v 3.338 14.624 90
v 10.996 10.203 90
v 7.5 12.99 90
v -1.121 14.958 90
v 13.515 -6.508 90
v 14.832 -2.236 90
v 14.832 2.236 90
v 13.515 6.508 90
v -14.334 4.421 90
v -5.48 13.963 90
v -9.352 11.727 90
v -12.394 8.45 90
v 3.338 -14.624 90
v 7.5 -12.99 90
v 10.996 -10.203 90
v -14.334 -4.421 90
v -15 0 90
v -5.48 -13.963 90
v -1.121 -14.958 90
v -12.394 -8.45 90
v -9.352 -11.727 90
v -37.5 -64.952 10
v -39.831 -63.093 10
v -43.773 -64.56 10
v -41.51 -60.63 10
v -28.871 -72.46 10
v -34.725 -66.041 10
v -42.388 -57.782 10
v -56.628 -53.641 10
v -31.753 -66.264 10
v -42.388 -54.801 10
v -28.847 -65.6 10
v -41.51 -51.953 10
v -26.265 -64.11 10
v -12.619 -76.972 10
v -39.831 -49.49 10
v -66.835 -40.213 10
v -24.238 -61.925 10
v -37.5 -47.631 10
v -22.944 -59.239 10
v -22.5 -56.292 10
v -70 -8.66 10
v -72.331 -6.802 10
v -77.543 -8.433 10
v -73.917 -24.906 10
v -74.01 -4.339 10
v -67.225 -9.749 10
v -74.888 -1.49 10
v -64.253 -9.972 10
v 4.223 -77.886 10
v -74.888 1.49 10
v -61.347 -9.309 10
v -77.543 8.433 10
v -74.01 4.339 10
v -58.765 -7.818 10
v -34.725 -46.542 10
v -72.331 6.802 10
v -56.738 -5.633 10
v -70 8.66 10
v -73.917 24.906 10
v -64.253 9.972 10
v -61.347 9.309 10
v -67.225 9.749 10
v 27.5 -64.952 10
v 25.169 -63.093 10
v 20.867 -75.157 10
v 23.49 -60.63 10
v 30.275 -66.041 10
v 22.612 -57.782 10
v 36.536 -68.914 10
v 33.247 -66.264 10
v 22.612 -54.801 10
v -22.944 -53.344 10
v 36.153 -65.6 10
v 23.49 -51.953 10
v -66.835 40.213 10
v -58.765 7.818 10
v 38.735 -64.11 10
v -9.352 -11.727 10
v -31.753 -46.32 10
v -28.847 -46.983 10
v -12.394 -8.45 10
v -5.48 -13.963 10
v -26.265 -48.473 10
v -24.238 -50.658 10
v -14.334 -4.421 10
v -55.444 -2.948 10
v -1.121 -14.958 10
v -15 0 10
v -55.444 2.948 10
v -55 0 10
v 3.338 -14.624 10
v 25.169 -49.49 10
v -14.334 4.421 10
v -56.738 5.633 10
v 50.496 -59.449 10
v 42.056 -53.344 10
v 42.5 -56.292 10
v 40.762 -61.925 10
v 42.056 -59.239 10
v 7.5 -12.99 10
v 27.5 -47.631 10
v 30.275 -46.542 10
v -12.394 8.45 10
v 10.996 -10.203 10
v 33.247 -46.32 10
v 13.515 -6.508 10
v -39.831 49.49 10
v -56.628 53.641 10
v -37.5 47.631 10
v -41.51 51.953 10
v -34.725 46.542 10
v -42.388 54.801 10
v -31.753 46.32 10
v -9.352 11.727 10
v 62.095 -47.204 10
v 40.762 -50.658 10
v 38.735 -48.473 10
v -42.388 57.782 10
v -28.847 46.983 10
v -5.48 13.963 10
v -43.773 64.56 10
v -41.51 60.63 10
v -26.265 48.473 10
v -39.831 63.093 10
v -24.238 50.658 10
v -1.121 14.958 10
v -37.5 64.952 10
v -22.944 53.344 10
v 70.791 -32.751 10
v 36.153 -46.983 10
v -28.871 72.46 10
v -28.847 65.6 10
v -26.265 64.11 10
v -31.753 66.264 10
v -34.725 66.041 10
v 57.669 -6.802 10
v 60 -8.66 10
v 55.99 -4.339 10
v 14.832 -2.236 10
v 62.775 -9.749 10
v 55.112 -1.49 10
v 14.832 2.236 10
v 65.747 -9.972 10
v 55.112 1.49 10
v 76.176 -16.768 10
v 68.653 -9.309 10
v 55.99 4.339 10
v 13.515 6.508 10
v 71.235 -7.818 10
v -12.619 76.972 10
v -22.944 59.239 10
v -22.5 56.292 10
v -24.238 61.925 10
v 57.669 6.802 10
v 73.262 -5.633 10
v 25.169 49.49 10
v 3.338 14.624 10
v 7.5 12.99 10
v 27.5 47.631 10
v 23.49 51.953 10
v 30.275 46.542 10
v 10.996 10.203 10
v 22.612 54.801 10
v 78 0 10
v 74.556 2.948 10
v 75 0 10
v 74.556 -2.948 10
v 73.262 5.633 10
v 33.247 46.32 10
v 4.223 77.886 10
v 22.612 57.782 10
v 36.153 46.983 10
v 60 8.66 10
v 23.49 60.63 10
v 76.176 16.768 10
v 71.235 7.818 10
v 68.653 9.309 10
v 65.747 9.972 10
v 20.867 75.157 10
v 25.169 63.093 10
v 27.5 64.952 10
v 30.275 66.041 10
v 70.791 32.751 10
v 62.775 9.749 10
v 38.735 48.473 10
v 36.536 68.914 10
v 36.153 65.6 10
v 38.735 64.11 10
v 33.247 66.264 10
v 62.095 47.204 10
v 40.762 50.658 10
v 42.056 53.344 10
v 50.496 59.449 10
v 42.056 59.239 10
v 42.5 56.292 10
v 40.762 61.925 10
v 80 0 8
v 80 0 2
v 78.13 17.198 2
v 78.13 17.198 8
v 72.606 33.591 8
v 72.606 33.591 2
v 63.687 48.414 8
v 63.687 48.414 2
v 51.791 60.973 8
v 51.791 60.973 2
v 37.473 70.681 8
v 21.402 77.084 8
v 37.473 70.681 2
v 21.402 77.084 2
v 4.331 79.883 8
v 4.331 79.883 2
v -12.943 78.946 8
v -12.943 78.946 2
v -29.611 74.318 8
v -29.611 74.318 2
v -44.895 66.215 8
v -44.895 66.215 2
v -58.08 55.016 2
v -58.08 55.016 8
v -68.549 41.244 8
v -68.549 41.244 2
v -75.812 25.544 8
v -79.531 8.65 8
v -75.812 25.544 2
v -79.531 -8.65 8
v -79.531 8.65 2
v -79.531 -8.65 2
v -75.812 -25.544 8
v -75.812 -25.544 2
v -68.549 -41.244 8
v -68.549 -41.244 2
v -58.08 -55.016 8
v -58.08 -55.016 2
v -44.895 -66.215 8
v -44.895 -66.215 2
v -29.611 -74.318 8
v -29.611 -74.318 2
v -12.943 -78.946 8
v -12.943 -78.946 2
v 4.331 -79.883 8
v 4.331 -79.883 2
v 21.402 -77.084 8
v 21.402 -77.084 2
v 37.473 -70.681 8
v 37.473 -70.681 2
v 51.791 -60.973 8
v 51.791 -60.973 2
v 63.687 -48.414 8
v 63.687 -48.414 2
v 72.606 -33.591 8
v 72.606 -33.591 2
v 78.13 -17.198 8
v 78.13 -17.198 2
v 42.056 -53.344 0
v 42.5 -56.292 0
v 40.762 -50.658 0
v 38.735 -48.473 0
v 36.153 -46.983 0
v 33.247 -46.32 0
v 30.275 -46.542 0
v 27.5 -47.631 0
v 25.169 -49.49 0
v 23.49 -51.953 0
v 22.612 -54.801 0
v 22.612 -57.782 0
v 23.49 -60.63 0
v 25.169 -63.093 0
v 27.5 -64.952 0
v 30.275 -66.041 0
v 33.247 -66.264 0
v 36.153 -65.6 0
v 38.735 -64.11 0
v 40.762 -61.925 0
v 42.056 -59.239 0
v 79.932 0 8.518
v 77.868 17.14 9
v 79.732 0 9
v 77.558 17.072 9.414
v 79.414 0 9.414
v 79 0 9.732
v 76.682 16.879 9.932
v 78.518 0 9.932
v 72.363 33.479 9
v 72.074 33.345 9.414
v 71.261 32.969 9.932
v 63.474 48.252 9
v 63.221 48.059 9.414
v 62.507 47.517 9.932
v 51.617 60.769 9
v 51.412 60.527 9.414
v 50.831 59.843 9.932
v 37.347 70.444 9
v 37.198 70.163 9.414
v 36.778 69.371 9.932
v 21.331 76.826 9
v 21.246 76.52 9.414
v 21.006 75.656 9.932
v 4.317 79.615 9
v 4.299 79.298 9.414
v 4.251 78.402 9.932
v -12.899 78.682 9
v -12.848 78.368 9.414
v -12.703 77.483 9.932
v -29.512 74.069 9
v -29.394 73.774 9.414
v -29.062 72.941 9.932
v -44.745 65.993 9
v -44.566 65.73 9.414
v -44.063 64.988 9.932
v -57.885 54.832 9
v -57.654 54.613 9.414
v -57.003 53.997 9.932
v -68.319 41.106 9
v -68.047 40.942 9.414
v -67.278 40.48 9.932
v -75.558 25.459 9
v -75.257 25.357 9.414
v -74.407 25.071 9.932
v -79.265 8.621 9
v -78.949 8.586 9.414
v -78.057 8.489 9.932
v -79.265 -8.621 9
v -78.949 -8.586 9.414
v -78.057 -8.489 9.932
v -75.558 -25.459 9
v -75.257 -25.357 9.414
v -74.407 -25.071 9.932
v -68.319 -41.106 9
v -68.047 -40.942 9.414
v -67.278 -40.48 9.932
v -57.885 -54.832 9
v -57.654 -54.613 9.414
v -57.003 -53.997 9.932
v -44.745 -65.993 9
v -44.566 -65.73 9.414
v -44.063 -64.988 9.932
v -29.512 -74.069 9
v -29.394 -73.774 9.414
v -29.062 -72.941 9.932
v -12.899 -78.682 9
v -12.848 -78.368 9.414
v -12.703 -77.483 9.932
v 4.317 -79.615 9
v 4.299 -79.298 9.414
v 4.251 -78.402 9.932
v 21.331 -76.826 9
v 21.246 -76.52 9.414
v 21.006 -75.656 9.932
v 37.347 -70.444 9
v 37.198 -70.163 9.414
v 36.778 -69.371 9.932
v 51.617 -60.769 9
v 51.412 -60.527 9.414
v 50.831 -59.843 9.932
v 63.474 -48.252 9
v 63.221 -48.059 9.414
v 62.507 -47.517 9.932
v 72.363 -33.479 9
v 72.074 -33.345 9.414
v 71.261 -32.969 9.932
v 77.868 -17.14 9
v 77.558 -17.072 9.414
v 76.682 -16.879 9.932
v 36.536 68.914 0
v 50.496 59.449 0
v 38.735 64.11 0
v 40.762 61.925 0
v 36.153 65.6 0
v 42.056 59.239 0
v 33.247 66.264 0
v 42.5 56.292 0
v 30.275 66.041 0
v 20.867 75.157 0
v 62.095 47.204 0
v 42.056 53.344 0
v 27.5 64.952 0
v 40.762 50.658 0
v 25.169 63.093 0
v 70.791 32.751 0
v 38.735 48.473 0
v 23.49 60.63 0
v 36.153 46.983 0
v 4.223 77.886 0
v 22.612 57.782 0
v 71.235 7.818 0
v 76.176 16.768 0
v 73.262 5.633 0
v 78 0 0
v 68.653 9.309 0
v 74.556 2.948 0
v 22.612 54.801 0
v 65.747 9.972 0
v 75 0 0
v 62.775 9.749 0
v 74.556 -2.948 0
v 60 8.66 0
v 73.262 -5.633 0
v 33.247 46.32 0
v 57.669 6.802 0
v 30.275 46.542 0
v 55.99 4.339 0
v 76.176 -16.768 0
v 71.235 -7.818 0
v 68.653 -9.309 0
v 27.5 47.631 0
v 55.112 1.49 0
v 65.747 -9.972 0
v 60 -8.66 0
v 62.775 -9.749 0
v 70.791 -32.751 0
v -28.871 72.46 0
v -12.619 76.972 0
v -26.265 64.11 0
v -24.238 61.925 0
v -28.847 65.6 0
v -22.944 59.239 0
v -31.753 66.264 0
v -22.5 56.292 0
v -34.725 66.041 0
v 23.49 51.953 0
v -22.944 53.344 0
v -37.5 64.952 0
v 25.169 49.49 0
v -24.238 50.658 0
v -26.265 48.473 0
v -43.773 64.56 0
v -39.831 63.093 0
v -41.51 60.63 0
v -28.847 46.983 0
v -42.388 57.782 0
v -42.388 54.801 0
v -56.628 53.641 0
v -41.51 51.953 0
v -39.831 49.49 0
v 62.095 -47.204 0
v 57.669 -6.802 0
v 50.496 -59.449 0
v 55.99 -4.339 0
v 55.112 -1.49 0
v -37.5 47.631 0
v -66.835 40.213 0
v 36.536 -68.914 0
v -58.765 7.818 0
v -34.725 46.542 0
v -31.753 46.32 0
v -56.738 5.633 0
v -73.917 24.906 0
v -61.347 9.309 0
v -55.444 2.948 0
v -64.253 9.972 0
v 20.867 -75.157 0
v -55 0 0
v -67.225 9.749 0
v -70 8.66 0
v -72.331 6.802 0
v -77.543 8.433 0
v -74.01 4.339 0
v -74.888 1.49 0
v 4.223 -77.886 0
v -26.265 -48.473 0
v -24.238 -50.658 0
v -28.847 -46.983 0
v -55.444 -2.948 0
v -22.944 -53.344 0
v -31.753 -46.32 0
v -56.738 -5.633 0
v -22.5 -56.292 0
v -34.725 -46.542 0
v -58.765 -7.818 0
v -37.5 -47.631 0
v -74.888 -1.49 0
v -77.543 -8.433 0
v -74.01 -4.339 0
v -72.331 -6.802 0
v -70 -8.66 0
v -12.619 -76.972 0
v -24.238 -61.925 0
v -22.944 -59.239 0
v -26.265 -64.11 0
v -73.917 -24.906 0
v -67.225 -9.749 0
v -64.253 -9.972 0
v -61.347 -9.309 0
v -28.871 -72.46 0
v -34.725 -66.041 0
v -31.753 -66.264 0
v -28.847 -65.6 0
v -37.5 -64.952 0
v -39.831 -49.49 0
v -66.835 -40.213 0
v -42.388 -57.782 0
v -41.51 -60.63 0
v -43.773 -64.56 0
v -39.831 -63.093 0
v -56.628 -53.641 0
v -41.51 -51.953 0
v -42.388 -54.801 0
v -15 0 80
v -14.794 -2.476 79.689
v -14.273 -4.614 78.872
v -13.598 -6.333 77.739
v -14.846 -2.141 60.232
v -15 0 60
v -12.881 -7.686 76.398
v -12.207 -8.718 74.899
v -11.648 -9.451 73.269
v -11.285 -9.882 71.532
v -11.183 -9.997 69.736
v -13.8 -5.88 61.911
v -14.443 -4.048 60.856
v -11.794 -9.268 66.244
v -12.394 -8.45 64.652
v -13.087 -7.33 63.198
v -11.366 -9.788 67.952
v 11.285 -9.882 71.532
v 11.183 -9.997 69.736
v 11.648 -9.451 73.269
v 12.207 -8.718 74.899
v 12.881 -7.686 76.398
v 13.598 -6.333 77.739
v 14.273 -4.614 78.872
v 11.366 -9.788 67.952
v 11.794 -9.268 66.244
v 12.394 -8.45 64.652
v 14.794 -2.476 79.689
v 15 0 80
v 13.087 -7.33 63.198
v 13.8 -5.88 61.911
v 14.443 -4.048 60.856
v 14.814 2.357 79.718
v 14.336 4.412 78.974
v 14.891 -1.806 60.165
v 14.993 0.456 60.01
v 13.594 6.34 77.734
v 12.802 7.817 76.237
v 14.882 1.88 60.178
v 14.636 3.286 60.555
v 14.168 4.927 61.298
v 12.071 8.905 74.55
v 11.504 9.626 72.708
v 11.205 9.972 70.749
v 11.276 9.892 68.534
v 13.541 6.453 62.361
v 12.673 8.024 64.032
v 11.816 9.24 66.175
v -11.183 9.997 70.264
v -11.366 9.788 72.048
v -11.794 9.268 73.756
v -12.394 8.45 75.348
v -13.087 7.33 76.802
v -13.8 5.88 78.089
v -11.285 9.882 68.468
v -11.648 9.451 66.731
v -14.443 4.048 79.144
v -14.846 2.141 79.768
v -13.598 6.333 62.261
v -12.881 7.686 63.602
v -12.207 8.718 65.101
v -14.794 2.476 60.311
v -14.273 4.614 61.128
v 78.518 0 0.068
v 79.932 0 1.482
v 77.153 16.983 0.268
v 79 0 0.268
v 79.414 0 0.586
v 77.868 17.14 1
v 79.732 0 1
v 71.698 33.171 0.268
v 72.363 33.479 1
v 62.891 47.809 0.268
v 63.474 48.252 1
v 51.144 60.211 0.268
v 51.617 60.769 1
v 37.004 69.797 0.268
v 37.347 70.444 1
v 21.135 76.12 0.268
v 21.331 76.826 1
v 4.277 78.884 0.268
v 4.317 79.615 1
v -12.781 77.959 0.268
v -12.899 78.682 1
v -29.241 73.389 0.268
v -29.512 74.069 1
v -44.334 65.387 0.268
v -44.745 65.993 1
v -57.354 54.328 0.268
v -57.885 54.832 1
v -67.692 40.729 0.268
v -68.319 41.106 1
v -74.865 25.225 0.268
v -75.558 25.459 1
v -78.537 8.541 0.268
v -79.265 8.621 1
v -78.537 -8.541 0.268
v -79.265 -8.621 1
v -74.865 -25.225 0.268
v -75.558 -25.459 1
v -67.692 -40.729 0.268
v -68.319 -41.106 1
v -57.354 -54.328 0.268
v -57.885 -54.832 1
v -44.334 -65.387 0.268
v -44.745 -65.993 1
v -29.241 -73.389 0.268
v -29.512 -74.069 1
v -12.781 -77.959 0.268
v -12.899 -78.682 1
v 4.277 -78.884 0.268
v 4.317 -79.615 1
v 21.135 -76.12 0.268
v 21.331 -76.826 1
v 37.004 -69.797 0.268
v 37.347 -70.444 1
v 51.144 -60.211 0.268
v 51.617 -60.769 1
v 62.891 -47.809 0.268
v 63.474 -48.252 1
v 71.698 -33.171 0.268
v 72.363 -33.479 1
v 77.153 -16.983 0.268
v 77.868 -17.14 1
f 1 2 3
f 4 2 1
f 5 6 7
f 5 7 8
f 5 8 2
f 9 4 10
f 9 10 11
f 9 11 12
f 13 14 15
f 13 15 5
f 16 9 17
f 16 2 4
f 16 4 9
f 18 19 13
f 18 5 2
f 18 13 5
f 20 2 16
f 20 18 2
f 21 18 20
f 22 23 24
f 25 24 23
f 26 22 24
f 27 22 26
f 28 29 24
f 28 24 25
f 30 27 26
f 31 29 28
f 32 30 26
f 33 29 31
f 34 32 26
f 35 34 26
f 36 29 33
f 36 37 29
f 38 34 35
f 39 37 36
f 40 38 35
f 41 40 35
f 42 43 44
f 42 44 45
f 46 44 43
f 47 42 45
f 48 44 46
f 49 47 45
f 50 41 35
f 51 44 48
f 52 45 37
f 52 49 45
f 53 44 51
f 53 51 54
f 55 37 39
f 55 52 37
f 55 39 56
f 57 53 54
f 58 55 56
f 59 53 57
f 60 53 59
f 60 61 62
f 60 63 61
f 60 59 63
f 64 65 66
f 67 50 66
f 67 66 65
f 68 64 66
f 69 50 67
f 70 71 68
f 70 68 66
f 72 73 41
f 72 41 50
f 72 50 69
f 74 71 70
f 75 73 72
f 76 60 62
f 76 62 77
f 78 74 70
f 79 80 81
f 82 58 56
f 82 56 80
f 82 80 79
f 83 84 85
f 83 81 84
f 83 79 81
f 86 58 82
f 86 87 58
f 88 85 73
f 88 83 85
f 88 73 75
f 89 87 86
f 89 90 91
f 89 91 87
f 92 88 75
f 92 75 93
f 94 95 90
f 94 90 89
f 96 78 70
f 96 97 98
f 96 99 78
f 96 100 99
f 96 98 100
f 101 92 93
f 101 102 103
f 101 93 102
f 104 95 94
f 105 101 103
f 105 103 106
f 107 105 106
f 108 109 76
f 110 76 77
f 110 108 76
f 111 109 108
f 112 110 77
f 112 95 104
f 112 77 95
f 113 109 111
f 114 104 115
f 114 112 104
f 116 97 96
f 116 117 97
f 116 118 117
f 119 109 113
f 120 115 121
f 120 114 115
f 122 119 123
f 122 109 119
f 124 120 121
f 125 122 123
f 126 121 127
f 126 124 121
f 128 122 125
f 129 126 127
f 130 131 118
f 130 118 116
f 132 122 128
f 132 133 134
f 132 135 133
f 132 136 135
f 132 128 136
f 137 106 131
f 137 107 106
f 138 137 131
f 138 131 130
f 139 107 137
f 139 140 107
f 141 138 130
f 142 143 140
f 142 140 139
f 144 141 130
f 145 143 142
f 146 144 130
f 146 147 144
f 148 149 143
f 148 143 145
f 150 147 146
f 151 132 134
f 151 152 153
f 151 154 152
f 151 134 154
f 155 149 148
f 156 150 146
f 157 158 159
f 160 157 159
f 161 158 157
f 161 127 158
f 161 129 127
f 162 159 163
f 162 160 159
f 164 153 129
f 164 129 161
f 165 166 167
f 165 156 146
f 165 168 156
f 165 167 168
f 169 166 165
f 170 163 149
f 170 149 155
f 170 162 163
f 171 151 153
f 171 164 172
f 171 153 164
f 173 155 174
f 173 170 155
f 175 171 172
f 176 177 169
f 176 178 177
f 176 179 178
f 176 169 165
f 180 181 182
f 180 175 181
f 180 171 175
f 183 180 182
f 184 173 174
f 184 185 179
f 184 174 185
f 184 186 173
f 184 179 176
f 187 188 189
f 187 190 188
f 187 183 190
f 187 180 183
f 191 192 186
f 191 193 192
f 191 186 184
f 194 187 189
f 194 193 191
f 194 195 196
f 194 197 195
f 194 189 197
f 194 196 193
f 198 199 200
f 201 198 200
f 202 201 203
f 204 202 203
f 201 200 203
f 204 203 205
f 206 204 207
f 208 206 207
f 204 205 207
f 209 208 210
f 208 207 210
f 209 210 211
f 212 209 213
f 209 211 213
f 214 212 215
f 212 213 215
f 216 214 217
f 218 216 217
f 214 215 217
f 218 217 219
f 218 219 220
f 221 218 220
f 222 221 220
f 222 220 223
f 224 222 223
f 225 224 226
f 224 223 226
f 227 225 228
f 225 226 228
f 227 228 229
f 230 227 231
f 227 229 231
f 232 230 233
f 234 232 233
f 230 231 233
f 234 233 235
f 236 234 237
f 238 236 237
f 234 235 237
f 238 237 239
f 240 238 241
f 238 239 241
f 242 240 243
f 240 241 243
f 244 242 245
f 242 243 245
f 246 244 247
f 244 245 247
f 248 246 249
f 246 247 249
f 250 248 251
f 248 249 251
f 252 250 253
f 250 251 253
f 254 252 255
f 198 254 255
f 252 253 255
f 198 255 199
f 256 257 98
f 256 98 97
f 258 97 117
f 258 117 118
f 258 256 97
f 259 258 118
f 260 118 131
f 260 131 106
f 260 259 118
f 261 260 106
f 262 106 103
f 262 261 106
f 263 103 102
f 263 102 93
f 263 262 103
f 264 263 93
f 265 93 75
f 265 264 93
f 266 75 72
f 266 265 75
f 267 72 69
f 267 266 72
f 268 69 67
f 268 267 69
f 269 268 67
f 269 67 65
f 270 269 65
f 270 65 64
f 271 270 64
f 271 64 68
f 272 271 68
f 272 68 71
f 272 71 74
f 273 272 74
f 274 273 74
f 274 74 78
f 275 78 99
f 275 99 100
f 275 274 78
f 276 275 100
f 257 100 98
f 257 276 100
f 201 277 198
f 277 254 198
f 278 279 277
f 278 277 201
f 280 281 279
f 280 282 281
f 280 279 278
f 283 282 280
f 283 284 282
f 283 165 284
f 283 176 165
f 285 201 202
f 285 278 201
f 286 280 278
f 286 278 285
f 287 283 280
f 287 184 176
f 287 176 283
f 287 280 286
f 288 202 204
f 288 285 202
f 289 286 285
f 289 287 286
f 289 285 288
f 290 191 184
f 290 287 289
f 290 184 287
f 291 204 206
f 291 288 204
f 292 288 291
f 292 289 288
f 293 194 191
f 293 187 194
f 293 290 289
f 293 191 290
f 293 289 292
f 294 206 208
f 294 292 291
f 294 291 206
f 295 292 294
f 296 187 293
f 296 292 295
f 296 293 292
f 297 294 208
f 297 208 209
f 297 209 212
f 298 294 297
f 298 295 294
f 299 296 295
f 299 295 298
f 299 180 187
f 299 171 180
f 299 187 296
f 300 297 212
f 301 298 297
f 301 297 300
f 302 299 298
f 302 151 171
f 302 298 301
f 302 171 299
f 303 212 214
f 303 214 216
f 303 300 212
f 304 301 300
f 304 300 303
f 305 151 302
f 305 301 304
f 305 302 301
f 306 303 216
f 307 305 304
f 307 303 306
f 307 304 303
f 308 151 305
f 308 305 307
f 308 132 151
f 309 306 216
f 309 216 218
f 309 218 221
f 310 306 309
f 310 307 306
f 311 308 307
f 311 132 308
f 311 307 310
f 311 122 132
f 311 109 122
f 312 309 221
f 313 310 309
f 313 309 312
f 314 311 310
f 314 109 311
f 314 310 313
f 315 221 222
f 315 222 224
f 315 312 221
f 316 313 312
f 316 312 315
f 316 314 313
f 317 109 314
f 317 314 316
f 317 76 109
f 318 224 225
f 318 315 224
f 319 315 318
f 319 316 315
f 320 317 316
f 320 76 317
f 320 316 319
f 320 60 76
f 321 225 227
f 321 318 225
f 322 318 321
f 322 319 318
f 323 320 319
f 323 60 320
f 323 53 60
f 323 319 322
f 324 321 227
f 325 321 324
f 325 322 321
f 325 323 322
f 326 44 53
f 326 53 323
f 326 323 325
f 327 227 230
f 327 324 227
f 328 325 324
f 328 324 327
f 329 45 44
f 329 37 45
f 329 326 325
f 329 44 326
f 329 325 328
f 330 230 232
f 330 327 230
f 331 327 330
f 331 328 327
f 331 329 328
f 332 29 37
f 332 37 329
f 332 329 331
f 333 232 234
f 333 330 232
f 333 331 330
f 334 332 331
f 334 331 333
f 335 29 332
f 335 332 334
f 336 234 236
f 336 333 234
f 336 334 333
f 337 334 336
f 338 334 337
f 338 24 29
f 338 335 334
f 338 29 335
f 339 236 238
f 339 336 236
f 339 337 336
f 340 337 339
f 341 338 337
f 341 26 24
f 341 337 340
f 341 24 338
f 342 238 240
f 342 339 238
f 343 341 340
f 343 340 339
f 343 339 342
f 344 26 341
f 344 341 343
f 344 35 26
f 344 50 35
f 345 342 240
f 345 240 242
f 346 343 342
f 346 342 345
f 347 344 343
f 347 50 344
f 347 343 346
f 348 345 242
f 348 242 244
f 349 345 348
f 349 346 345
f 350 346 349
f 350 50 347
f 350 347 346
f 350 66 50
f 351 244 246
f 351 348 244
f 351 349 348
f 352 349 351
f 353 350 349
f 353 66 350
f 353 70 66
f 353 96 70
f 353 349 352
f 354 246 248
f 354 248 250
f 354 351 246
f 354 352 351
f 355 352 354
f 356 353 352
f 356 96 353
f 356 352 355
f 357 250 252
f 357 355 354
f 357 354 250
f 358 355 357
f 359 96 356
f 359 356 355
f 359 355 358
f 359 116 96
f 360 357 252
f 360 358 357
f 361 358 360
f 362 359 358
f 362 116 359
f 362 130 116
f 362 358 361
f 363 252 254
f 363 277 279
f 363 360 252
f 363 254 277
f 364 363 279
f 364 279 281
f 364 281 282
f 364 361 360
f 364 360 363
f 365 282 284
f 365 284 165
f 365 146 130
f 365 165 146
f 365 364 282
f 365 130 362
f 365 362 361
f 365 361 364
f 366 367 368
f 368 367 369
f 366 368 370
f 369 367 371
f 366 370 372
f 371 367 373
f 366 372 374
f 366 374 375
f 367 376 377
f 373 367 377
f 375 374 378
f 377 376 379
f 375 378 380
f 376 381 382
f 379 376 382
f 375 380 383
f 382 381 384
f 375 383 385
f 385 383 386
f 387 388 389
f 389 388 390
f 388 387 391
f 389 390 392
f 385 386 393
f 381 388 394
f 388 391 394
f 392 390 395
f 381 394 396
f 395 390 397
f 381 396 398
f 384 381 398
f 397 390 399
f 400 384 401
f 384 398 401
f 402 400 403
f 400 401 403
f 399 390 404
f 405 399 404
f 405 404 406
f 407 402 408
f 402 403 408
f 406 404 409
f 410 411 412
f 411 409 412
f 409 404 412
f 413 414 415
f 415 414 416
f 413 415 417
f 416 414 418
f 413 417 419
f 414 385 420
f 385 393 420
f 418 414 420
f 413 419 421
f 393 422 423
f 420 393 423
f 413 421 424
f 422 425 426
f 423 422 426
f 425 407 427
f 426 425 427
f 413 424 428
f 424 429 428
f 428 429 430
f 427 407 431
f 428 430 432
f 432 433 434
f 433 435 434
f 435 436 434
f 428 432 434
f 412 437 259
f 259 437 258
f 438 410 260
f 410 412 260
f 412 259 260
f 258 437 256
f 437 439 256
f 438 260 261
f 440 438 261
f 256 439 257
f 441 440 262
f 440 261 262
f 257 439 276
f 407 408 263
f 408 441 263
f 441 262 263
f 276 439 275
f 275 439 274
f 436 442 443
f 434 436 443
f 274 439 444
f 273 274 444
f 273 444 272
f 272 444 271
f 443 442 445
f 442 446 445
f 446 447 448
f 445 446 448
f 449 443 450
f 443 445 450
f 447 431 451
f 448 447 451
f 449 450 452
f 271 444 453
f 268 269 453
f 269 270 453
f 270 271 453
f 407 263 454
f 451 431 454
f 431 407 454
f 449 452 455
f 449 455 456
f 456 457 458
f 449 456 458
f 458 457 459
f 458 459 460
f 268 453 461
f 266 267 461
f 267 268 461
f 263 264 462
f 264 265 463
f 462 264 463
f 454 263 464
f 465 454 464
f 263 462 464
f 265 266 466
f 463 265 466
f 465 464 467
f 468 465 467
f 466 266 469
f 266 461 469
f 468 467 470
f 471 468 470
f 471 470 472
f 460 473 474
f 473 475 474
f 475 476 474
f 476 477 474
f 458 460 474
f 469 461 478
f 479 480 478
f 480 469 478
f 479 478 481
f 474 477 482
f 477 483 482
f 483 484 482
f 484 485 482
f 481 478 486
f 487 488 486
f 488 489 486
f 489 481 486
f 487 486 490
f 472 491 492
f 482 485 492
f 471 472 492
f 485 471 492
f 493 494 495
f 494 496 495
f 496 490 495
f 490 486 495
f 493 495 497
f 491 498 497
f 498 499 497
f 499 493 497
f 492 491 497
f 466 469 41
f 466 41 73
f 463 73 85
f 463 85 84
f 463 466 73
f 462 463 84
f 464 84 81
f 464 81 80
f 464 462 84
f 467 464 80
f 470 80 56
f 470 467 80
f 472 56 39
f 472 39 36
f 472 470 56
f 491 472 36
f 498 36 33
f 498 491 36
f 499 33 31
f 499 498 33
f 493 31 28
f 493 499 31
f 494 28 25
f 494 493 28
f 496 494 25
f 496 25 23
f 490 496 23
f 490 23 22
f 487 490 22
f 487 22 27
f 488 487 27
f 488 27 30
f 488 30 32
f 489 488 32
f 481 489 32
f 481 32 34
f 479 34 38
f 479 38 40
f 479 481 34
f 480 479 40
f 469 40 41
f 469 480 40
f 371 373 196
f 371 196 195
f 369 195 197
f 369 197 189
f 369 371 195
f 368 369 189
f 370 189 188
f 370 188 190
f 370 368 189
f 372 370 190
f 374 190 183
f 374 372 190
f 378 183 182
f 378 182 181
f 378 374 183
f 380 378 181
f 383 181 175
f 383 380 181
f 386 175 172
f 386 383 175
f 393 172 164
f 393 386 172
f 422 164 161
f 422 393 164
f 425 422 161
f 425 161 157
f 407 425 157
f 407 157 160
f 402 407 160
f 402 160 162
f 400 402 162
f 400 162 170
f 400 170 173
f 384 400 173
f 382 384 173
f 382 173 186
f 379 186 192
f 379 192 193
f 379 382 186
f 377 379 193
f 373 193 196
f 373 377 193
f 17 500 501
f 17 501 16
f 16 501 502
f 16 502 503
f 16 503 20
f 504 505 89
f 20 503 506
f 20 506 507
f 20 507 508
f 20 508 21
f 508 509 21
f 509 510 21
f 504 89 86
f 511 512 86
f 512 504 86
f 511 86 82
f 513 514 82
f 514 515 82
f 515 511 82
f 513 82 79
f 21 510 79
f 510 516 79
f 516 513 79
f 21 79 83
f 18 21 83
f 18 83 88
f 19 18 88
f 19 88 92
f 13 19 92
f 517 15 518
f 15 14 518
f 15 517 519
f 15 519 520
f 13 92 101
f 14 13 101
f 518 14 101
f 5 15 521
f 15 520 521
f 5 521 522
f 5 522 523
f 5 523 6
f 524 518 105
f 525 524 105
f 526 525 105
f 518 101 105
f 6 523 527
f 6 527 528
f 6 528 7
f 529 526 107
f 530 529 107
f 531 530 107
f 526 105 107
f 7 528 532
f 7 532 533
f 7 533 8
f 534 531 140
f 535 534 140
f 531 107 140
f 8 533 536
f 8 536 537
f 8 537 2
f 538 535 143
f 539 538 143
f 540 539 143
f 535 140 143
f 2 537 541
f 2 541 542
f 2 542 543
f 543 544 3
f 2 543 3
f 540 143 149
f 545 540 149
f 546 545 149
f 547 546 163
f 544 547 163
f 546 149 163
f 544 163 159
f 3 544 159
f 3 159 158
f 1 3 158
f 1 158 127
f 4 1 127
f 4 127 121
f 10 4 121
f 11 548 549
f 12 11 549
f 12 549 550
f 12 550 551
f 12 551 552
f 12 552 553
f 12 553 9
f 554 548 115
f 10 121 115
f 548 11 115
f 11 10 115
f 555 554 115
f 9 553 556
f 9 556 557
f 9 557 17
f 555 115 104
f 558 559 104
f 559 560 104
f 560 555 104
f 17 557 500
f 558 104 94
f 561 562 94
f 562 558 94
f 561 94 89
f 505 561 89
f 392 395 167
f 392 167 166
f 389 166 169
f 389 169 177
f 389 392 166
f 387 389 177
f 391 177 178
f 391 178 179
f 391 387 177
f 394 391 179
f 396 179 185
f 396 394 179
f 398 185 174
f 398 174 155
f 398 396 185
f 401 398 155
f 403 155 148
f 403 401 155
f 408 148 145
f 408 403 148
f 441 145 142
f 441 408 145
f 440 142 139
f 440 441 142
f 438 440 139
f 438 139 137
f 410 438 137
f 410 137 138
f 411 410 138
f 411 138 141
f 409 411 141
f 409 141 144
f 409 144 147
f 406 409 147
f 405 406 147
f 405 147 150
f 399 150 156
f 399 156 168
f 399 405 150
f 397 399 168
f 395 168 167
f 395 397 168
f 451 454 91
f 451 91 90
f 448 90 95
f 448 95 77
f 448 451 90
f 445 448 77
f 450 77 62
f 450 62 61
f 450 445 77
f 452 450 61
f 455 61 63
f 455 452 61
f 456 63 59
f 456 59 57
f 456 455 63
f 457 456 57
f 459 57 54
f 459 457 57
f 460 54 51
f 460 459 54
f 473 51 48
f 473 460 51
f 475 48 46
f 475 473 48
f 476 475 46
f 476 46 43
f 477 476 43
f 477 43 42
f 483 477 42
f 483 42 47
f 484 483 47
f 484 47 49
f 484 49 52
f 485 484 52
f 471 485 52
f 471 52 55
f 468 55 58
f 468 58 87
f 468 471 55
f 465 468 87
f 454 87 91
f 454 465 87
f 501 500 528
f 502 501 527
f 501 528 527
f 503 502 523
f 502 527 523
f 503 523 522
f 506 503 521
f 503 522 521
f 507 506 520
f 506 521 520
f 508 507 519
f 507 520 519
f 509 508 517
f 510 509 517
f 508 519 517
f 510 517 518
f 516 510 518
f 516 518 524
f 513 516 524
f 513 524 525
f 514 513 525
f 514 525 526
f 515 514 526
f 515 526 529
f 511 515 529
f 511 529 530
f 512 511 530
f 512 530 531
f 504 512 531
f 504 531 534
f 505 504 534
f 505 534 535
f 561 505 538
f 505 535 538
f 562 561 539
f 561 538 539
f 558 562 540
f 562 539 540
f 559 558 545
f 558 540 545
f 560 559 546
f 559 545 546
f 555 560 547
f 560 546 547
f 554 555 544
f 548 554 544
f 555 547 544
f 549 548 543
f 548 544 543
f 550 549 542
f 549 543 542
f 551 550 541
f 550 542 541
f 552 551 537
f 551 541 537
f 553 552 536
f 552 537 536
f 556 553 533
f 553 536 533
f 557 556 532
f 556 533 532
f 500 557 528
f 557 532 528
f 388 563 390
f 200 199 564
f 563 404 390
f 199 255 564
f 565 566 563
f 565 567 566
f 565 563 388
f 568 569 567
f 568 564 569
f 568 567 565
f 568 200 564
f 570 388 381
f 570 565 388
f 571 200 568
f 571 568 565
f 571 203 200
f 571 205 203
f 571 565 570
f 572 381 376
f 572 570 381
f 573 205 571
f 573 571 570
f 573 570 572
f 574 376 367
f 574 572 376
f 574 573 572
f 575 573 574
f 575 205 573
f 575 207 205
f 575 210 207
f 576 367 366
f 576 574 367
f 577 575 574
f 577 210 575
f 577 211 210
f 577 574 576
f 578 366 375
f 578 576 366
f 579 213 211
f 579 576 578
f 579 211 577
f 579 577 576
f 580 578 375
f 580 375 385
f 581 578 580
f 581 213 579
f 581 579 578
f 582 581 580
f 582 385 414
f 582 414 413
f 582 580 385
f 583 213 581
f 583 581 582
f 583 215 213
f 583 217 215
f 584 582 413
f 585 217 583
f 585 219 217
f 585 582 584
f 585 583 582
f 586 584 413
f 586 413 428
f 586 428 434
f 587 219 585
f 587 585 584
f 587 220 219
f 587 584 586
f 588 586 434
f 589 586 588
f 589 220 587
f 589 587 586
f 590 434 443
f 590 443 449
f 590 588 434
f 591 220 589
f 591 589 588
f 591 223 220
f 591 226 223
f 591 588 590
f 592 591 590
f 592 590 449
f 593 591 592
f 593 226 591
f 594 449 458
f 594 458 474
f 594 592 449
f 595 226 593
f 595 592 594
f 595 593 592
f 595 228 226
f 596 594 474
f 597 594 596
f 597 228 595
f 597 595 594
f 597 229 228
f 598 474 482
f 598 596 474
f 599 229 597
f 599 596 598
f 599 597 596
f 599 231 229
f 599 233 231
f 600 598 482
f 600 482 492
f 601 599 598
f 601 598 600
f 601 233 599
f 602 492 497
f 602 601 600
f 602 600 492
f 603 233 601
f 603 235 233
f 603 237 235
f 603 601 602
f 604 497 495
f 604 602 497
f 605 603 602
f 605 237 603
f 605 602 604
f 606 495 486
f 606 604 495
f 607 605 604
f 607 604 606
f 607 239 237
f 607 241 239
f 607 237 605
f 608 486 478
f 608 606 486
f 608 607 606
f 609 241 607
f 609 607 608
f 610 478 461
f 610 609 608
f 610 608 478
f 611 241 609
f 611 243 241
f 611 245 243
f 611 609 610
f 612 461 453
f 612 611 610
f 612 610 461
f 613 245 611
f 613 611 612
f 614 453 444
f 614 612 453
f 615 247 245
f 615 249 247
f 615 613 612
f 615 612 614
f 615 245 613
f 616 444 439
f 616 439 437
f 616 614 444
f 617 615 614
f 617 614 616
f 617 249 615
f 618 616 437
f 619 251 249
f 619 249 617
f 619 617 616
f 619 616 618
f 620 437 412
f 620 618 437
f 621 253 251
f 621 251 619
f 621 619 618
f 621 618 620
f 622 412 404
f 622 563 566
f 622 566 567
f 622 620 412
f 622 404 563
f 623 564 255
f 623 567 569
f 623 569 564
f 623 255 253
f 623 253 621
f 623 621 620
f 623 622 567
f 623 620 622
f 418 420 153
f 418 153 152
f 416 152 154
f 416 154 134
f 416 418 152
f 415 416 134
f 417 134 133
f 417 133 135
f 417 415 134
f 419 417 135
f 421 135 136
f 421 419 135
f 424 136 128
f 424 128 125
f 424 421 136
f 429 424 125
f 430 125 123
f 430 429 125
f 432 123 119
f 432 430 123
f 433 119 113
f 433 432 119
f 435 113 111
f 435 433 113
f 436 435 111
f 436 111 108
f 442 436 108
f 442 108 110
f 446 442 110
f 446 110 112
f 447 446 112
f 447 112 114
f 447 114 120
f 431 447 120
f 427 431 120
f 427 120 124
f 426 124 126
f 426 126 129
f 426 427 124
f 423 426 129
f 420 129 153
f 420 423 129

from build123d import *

# Parameters (mm, degrees)
SKETCH_1_R          = 80
SKETCH_1_R_2        = 10
EXTRUDE_1_DEPTH     = 10
SKETCH_3_R          = 15
EXTRUDE_4_DEPTH     = 90
SKETCH_4_R          = 10
CUT_EXTRUDE_3_DEPTH = 45
FILLET_1_R          = 2


with BuildPart() as part:
    # 草图1 → 凸台-拉伸1 (new body)
    with BuildSketch(Plane.XY):
        Circle(SKETCH_1_R)
        with Locations((-65, 0)):
            Circle(SKETCH_1_R_2, mode=Mode.SUBTRACT)
        with Locations((-32.5, 56.291651246)):
            Circle(SKETCH_1_R_2, mode=Mode.SUBTRACT)
        with Locations((32.5, 56.291651246)):
            Circle(SKETCH_1_R_2, mode=Mode.SUBTRACT)
        with Locations((65, 0)):
            Circle(SKETCH_1_R_2, mode=Mode.SUBTRACT)
        with Locations((32.5, -56.291651246)):
            Circle(SKETCH_1_R_2, mode=Mode.SUBTRACT)
        with Locations((-32.5, -56.291651246)):
            Circle(SKETCH_1_R_2, mode=Mode.SUBTRACT)
    extrude(amount=EXTRUDE_1_DEPTH)

    # 草图3 → 凸台-拉伸4 (add)
    with BuildSketch(Plane.XY):
        with Locations(Location((0, 0, 0), (0, 0, 180))):
            Circle(SKETCH_3_R)
    extrude(amount=EXTRUDE_4_DEPTH)

    # 草图4 → 切除-拉伸3 (cut, symmetric)
    with BuildSketch(Plane(origin=(0, 0, 0), x_dir=(0, 0, -1), z_dir=(1, 0, 0))):
        with Locations(Location((-70, 0, 0), (0, 0, 180))):
            Circle(SKETCH_4_R)
    extrude(amount=CUT_EXTRUDE_3_DEPTH, both=True, mode=Mode.SUBTRACT)

    # 圆角1
    fillet_1_edges = [part.edges().sort_by_distance(p)[0] for p in [
        (-80, 0, 0),
        (-80, 0, 10),
    ]]
    fillet(fillet_1_edges, radius=FILLET_1_R)


solid = part.part
